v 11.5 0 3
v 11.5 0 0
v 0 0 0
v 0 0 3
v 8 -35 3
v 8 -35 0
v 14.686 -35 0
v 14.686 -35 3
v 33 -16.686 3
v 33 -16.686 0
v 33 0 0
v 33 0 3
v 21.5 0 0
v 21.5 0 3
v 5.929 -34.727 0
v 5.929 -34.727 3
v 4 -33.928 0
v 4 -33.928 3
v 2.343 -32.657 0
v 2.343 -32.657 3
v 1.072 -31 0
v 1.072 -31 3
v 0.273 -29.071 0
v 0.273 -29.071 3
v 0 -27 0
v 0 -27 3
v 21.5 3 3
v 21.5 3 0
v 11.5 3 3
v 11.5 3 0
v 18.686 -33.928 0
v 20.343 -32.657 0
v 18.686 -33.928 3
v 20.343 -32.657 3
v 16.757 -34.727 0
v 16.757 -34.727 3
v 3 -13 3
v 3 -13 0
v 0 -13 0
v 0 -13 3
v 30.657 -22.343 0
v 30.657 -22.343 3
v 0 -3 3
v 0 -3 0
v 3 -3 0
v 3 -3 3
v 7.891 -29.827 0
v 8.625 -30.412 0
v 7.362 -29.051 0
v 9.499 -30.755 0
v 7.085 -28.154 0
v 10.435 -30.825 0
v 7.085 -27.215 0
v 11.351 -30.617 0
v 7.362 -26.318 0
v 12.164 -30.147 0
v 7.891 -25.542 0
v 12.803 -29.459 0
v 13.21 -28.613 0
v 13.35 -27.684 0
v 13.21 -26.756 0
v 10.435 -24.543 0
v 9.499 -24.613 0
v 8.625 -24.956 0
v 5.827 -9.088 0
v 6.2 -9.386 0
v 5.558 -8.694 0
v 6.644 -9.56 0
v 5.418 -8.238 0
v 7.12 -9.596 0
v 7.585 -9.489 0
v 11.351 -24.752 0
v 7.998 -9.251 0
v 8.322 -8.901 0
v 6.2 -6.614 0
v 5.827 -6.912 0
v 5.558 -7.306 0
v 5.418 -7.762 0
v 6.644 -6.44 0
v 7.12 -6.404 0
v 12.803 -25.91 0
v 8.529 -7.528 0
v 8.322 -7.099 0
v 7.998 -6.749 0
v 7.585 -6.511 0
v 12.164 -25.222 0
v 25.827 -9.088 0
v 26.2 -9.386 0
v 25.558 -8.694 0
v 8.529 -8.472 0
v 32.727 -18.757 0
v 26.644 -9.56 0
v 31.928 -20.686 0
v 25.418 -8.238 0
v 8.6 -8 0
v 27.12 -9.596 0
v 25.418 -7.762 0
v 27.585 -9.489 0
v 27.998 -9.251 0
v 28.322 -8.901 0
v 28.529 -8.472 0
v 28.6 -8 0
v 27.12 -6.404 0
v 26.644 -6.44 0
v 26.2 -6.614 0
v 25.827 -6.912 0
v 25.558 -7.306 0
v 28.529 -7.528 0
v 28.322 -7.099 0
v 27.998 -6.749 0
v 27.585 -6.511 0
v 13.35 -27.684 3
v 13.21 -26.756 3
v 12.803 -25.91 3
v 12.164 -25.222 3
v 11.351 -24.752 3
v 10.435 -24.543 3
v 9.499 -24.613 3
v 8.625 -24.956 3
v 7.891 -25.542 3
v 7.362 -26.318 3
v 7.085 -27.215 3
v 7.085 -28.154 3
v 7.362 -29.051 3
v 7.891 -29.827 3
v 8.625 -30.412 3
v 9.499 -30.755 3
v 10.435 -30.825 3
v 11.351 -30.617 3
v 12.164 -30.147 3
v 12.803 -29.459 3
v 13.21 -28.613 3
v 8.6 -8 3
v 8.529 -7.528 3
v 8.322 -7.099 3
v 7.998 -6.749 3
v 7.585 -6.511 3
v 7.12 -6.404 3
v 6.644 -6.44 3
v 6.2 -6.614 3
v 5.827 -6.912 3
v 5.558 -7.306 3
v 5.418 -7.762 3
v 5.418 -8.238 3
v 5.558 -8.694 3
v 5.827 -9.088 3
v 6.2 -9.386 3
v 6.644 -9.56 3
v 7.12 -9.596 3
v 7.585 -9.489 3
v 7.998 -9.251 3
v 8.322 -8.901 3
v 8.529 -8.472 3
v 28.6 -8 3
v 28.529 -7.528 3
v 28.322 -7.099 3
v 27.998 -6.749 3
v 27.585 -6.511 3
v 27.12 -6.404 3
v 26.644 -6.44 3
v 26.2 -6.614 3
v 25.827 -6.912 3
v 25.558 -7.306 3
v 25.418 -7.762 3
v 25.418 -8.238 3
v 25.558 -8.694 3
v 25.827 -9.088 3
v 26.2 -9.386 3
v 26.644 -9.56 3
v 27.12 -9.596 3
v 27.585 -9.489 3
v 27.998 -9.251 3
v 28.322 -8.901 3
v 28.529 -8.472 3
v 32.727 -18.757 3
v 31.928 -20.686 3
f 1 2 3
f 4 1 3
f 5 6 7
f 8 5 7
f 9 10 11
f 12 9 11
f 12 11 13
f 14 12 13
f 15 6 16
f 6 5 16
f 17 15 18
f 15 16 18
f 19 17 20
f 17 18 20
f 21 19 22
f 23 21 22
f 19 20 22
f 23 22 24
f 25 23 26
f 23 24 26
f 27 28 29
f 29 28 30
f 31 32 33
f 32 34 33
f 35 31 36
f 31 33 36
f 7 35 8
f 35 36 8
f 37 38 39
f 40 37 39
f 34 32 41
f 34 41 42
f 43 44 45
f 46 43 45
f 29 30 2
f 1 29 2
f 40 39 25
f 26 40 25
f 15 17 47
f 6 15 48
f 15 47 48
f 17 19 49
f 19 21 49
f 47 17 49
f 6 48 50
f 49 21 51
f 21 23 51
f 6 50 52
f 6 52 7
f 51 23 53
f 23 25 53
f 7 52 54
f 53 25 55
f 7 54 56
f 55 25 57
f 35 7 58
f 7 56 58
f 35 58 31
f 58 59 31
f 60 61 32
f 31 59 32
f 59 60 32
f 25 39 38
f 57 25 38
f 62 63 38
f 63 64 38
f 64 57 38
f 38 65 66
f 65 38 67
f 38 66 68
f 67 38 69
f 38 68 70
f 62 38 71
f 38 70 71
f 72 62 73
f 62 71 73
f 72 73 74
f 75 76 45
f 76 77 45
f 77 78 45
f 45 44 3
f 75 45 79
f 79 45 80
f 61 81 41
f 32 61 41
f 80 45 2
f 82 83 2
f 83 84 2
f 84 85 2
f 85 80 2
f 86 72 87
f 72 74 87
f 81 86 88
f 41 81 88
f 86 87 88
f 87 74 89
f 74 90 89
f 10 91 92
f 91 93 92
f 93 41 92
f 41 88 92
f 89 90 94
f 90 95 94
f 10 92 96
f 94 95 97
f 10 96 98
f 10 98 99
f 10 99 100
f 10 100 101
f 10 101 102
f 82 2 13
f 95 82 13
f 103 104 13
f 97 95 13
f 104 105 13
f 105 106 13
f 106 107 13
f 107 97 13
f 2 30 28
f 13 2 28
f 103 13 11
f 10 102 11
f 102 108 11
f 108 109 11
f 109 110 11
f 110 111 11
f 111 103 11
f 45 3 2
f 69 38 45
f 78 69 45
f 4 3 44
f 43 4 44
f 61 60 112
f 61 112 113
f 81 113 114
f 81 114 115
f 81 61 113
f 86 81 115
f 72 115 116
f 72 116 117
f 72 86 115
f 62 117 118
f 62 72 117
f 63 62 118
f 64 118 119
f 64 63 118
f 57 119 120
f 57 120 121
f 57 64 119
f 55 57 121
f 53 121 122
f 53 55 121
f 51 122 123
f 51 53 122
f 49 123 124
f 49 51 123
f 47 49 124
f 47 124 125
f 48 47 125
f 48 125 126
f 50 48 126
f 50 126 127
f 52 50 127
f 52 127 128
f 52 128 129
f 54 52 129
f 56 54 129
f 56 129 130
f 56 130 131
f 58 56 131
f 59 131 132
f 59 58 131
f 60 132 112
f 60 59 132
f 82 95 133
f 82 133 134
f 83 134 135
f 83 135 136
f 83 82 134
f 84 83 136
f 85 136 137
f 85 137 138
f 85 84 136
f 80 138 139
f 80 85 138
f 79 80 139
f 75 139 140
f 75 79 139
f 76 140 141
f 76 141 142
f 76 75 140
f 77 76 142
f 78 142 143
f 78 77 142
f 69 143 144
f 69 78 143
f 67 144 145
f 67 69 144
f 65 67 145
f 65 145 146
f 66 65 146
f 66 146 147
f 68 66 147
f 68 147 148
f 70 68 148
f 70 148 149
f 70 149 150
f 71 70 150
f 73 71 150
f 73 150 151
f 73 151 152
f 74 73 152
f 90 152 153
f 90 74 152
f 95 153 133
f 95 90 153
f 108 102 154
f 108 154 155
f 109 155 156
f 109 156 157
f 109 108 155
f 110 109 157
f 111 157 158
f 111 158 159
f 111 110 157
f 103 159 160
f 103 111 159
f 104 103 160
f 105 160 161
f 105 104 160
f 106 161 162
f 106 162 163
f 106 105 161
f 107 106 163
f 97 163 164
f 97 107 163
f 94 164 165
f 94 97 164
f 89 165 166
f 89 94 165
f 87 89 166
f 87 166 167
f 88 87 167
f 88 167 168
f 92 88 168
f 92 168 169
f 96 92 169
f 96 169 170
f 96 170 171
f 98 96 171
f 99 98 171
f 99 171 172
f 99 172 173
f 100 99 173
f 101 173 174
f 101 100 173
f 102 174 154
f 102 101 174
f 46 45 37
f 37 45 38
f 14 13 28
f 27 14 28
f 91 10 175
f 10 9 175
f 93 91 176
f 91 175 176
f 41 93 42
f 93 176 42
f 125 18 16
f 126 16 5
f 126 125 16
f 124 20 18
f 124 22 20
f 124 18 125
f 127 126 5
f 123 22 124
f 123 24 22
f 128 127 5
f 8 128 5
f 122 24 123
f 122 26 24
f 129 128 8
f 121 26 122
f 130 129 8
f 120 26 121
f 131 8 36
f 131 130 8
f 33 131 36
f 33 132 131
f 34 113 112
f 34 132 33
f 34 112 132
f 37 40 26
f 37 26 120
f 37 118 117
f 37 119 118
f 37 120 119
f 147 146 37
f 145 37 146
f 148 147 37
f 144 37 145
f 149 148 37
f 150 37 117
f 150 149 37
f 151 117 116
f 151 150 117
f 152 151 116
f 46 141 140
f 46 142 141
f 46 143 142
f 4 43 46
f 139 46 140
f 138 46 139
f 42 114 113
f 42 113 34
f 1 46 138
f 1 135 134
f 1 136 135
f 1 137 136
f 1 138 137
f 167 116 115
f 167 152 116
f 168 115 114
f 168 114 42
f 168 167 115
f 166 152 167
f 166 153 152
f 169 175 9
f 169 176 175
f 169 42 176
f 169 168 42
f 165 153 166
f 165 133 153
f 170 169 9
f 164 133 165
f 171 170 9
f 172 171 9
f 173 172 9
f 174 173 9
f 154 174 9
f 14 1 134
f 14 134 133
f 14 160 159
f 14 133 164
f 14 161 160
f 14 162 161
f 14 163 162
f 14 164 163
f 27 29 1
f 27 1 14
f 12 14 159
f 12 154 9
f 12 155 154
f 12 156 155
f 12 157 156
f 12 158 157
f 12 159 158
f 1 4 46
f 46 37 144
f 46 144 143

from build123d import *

# Parameters (mm, degrees)
ESBO_O1_R                = 1.6
ESBO_O1_R_2              = 3.15
RESSALTO_EXTRUS_O1_DEPTH = 3
CHANFRO2_SIZE            = 15
FILETE2_R                = 8


with BuildPart() as part:
    # Esboço1 → Ressalto-extrusão1 (new body)
    with BuildSketch(Plane.XY):
        Polygon((11.5, 0), (0, 0), (0, -3), (3, -3), (3, -13), (0, -13), (0, -35), (33, -35), (33, 0), (21.5, 0), (21.5, 3), (11.5, 3), align=None)
        with Locations((27, -8)):
            Circle(ESBO_O1_R, mode=Mode.SUBTRACT)
        with Locations((7, -8)):
            Circle(ESBO_O1_R, mode=Mode.SUBTRACT)
        with Locations((10.2, -27.684295139)):
            Circle(ESBO_O1_R_2, mode=Mode.SUBTRACT)
    extrude(amount=RESSALTO_EXTRUS_O1_DEPTH)

    # Chanfro2
    chanfro2_edges = [part.edges().sort_by_distance(p)[0] for p in [
        (33, -35, 1.5),
    ]]
    chamfer(chanfro2_edges, length=CHANFRO2_SIZE)

    # Filete2
    filete2_edges = [part.edges().sort_by_distance(p)[0] for p in [
        (0, -35, 1.5),
        (33, -20, 1.5),
        (18, -35, 1.5),
    ]]
    fillet(filete2_edges, radius=FILETE2_R)


solid = part.part
